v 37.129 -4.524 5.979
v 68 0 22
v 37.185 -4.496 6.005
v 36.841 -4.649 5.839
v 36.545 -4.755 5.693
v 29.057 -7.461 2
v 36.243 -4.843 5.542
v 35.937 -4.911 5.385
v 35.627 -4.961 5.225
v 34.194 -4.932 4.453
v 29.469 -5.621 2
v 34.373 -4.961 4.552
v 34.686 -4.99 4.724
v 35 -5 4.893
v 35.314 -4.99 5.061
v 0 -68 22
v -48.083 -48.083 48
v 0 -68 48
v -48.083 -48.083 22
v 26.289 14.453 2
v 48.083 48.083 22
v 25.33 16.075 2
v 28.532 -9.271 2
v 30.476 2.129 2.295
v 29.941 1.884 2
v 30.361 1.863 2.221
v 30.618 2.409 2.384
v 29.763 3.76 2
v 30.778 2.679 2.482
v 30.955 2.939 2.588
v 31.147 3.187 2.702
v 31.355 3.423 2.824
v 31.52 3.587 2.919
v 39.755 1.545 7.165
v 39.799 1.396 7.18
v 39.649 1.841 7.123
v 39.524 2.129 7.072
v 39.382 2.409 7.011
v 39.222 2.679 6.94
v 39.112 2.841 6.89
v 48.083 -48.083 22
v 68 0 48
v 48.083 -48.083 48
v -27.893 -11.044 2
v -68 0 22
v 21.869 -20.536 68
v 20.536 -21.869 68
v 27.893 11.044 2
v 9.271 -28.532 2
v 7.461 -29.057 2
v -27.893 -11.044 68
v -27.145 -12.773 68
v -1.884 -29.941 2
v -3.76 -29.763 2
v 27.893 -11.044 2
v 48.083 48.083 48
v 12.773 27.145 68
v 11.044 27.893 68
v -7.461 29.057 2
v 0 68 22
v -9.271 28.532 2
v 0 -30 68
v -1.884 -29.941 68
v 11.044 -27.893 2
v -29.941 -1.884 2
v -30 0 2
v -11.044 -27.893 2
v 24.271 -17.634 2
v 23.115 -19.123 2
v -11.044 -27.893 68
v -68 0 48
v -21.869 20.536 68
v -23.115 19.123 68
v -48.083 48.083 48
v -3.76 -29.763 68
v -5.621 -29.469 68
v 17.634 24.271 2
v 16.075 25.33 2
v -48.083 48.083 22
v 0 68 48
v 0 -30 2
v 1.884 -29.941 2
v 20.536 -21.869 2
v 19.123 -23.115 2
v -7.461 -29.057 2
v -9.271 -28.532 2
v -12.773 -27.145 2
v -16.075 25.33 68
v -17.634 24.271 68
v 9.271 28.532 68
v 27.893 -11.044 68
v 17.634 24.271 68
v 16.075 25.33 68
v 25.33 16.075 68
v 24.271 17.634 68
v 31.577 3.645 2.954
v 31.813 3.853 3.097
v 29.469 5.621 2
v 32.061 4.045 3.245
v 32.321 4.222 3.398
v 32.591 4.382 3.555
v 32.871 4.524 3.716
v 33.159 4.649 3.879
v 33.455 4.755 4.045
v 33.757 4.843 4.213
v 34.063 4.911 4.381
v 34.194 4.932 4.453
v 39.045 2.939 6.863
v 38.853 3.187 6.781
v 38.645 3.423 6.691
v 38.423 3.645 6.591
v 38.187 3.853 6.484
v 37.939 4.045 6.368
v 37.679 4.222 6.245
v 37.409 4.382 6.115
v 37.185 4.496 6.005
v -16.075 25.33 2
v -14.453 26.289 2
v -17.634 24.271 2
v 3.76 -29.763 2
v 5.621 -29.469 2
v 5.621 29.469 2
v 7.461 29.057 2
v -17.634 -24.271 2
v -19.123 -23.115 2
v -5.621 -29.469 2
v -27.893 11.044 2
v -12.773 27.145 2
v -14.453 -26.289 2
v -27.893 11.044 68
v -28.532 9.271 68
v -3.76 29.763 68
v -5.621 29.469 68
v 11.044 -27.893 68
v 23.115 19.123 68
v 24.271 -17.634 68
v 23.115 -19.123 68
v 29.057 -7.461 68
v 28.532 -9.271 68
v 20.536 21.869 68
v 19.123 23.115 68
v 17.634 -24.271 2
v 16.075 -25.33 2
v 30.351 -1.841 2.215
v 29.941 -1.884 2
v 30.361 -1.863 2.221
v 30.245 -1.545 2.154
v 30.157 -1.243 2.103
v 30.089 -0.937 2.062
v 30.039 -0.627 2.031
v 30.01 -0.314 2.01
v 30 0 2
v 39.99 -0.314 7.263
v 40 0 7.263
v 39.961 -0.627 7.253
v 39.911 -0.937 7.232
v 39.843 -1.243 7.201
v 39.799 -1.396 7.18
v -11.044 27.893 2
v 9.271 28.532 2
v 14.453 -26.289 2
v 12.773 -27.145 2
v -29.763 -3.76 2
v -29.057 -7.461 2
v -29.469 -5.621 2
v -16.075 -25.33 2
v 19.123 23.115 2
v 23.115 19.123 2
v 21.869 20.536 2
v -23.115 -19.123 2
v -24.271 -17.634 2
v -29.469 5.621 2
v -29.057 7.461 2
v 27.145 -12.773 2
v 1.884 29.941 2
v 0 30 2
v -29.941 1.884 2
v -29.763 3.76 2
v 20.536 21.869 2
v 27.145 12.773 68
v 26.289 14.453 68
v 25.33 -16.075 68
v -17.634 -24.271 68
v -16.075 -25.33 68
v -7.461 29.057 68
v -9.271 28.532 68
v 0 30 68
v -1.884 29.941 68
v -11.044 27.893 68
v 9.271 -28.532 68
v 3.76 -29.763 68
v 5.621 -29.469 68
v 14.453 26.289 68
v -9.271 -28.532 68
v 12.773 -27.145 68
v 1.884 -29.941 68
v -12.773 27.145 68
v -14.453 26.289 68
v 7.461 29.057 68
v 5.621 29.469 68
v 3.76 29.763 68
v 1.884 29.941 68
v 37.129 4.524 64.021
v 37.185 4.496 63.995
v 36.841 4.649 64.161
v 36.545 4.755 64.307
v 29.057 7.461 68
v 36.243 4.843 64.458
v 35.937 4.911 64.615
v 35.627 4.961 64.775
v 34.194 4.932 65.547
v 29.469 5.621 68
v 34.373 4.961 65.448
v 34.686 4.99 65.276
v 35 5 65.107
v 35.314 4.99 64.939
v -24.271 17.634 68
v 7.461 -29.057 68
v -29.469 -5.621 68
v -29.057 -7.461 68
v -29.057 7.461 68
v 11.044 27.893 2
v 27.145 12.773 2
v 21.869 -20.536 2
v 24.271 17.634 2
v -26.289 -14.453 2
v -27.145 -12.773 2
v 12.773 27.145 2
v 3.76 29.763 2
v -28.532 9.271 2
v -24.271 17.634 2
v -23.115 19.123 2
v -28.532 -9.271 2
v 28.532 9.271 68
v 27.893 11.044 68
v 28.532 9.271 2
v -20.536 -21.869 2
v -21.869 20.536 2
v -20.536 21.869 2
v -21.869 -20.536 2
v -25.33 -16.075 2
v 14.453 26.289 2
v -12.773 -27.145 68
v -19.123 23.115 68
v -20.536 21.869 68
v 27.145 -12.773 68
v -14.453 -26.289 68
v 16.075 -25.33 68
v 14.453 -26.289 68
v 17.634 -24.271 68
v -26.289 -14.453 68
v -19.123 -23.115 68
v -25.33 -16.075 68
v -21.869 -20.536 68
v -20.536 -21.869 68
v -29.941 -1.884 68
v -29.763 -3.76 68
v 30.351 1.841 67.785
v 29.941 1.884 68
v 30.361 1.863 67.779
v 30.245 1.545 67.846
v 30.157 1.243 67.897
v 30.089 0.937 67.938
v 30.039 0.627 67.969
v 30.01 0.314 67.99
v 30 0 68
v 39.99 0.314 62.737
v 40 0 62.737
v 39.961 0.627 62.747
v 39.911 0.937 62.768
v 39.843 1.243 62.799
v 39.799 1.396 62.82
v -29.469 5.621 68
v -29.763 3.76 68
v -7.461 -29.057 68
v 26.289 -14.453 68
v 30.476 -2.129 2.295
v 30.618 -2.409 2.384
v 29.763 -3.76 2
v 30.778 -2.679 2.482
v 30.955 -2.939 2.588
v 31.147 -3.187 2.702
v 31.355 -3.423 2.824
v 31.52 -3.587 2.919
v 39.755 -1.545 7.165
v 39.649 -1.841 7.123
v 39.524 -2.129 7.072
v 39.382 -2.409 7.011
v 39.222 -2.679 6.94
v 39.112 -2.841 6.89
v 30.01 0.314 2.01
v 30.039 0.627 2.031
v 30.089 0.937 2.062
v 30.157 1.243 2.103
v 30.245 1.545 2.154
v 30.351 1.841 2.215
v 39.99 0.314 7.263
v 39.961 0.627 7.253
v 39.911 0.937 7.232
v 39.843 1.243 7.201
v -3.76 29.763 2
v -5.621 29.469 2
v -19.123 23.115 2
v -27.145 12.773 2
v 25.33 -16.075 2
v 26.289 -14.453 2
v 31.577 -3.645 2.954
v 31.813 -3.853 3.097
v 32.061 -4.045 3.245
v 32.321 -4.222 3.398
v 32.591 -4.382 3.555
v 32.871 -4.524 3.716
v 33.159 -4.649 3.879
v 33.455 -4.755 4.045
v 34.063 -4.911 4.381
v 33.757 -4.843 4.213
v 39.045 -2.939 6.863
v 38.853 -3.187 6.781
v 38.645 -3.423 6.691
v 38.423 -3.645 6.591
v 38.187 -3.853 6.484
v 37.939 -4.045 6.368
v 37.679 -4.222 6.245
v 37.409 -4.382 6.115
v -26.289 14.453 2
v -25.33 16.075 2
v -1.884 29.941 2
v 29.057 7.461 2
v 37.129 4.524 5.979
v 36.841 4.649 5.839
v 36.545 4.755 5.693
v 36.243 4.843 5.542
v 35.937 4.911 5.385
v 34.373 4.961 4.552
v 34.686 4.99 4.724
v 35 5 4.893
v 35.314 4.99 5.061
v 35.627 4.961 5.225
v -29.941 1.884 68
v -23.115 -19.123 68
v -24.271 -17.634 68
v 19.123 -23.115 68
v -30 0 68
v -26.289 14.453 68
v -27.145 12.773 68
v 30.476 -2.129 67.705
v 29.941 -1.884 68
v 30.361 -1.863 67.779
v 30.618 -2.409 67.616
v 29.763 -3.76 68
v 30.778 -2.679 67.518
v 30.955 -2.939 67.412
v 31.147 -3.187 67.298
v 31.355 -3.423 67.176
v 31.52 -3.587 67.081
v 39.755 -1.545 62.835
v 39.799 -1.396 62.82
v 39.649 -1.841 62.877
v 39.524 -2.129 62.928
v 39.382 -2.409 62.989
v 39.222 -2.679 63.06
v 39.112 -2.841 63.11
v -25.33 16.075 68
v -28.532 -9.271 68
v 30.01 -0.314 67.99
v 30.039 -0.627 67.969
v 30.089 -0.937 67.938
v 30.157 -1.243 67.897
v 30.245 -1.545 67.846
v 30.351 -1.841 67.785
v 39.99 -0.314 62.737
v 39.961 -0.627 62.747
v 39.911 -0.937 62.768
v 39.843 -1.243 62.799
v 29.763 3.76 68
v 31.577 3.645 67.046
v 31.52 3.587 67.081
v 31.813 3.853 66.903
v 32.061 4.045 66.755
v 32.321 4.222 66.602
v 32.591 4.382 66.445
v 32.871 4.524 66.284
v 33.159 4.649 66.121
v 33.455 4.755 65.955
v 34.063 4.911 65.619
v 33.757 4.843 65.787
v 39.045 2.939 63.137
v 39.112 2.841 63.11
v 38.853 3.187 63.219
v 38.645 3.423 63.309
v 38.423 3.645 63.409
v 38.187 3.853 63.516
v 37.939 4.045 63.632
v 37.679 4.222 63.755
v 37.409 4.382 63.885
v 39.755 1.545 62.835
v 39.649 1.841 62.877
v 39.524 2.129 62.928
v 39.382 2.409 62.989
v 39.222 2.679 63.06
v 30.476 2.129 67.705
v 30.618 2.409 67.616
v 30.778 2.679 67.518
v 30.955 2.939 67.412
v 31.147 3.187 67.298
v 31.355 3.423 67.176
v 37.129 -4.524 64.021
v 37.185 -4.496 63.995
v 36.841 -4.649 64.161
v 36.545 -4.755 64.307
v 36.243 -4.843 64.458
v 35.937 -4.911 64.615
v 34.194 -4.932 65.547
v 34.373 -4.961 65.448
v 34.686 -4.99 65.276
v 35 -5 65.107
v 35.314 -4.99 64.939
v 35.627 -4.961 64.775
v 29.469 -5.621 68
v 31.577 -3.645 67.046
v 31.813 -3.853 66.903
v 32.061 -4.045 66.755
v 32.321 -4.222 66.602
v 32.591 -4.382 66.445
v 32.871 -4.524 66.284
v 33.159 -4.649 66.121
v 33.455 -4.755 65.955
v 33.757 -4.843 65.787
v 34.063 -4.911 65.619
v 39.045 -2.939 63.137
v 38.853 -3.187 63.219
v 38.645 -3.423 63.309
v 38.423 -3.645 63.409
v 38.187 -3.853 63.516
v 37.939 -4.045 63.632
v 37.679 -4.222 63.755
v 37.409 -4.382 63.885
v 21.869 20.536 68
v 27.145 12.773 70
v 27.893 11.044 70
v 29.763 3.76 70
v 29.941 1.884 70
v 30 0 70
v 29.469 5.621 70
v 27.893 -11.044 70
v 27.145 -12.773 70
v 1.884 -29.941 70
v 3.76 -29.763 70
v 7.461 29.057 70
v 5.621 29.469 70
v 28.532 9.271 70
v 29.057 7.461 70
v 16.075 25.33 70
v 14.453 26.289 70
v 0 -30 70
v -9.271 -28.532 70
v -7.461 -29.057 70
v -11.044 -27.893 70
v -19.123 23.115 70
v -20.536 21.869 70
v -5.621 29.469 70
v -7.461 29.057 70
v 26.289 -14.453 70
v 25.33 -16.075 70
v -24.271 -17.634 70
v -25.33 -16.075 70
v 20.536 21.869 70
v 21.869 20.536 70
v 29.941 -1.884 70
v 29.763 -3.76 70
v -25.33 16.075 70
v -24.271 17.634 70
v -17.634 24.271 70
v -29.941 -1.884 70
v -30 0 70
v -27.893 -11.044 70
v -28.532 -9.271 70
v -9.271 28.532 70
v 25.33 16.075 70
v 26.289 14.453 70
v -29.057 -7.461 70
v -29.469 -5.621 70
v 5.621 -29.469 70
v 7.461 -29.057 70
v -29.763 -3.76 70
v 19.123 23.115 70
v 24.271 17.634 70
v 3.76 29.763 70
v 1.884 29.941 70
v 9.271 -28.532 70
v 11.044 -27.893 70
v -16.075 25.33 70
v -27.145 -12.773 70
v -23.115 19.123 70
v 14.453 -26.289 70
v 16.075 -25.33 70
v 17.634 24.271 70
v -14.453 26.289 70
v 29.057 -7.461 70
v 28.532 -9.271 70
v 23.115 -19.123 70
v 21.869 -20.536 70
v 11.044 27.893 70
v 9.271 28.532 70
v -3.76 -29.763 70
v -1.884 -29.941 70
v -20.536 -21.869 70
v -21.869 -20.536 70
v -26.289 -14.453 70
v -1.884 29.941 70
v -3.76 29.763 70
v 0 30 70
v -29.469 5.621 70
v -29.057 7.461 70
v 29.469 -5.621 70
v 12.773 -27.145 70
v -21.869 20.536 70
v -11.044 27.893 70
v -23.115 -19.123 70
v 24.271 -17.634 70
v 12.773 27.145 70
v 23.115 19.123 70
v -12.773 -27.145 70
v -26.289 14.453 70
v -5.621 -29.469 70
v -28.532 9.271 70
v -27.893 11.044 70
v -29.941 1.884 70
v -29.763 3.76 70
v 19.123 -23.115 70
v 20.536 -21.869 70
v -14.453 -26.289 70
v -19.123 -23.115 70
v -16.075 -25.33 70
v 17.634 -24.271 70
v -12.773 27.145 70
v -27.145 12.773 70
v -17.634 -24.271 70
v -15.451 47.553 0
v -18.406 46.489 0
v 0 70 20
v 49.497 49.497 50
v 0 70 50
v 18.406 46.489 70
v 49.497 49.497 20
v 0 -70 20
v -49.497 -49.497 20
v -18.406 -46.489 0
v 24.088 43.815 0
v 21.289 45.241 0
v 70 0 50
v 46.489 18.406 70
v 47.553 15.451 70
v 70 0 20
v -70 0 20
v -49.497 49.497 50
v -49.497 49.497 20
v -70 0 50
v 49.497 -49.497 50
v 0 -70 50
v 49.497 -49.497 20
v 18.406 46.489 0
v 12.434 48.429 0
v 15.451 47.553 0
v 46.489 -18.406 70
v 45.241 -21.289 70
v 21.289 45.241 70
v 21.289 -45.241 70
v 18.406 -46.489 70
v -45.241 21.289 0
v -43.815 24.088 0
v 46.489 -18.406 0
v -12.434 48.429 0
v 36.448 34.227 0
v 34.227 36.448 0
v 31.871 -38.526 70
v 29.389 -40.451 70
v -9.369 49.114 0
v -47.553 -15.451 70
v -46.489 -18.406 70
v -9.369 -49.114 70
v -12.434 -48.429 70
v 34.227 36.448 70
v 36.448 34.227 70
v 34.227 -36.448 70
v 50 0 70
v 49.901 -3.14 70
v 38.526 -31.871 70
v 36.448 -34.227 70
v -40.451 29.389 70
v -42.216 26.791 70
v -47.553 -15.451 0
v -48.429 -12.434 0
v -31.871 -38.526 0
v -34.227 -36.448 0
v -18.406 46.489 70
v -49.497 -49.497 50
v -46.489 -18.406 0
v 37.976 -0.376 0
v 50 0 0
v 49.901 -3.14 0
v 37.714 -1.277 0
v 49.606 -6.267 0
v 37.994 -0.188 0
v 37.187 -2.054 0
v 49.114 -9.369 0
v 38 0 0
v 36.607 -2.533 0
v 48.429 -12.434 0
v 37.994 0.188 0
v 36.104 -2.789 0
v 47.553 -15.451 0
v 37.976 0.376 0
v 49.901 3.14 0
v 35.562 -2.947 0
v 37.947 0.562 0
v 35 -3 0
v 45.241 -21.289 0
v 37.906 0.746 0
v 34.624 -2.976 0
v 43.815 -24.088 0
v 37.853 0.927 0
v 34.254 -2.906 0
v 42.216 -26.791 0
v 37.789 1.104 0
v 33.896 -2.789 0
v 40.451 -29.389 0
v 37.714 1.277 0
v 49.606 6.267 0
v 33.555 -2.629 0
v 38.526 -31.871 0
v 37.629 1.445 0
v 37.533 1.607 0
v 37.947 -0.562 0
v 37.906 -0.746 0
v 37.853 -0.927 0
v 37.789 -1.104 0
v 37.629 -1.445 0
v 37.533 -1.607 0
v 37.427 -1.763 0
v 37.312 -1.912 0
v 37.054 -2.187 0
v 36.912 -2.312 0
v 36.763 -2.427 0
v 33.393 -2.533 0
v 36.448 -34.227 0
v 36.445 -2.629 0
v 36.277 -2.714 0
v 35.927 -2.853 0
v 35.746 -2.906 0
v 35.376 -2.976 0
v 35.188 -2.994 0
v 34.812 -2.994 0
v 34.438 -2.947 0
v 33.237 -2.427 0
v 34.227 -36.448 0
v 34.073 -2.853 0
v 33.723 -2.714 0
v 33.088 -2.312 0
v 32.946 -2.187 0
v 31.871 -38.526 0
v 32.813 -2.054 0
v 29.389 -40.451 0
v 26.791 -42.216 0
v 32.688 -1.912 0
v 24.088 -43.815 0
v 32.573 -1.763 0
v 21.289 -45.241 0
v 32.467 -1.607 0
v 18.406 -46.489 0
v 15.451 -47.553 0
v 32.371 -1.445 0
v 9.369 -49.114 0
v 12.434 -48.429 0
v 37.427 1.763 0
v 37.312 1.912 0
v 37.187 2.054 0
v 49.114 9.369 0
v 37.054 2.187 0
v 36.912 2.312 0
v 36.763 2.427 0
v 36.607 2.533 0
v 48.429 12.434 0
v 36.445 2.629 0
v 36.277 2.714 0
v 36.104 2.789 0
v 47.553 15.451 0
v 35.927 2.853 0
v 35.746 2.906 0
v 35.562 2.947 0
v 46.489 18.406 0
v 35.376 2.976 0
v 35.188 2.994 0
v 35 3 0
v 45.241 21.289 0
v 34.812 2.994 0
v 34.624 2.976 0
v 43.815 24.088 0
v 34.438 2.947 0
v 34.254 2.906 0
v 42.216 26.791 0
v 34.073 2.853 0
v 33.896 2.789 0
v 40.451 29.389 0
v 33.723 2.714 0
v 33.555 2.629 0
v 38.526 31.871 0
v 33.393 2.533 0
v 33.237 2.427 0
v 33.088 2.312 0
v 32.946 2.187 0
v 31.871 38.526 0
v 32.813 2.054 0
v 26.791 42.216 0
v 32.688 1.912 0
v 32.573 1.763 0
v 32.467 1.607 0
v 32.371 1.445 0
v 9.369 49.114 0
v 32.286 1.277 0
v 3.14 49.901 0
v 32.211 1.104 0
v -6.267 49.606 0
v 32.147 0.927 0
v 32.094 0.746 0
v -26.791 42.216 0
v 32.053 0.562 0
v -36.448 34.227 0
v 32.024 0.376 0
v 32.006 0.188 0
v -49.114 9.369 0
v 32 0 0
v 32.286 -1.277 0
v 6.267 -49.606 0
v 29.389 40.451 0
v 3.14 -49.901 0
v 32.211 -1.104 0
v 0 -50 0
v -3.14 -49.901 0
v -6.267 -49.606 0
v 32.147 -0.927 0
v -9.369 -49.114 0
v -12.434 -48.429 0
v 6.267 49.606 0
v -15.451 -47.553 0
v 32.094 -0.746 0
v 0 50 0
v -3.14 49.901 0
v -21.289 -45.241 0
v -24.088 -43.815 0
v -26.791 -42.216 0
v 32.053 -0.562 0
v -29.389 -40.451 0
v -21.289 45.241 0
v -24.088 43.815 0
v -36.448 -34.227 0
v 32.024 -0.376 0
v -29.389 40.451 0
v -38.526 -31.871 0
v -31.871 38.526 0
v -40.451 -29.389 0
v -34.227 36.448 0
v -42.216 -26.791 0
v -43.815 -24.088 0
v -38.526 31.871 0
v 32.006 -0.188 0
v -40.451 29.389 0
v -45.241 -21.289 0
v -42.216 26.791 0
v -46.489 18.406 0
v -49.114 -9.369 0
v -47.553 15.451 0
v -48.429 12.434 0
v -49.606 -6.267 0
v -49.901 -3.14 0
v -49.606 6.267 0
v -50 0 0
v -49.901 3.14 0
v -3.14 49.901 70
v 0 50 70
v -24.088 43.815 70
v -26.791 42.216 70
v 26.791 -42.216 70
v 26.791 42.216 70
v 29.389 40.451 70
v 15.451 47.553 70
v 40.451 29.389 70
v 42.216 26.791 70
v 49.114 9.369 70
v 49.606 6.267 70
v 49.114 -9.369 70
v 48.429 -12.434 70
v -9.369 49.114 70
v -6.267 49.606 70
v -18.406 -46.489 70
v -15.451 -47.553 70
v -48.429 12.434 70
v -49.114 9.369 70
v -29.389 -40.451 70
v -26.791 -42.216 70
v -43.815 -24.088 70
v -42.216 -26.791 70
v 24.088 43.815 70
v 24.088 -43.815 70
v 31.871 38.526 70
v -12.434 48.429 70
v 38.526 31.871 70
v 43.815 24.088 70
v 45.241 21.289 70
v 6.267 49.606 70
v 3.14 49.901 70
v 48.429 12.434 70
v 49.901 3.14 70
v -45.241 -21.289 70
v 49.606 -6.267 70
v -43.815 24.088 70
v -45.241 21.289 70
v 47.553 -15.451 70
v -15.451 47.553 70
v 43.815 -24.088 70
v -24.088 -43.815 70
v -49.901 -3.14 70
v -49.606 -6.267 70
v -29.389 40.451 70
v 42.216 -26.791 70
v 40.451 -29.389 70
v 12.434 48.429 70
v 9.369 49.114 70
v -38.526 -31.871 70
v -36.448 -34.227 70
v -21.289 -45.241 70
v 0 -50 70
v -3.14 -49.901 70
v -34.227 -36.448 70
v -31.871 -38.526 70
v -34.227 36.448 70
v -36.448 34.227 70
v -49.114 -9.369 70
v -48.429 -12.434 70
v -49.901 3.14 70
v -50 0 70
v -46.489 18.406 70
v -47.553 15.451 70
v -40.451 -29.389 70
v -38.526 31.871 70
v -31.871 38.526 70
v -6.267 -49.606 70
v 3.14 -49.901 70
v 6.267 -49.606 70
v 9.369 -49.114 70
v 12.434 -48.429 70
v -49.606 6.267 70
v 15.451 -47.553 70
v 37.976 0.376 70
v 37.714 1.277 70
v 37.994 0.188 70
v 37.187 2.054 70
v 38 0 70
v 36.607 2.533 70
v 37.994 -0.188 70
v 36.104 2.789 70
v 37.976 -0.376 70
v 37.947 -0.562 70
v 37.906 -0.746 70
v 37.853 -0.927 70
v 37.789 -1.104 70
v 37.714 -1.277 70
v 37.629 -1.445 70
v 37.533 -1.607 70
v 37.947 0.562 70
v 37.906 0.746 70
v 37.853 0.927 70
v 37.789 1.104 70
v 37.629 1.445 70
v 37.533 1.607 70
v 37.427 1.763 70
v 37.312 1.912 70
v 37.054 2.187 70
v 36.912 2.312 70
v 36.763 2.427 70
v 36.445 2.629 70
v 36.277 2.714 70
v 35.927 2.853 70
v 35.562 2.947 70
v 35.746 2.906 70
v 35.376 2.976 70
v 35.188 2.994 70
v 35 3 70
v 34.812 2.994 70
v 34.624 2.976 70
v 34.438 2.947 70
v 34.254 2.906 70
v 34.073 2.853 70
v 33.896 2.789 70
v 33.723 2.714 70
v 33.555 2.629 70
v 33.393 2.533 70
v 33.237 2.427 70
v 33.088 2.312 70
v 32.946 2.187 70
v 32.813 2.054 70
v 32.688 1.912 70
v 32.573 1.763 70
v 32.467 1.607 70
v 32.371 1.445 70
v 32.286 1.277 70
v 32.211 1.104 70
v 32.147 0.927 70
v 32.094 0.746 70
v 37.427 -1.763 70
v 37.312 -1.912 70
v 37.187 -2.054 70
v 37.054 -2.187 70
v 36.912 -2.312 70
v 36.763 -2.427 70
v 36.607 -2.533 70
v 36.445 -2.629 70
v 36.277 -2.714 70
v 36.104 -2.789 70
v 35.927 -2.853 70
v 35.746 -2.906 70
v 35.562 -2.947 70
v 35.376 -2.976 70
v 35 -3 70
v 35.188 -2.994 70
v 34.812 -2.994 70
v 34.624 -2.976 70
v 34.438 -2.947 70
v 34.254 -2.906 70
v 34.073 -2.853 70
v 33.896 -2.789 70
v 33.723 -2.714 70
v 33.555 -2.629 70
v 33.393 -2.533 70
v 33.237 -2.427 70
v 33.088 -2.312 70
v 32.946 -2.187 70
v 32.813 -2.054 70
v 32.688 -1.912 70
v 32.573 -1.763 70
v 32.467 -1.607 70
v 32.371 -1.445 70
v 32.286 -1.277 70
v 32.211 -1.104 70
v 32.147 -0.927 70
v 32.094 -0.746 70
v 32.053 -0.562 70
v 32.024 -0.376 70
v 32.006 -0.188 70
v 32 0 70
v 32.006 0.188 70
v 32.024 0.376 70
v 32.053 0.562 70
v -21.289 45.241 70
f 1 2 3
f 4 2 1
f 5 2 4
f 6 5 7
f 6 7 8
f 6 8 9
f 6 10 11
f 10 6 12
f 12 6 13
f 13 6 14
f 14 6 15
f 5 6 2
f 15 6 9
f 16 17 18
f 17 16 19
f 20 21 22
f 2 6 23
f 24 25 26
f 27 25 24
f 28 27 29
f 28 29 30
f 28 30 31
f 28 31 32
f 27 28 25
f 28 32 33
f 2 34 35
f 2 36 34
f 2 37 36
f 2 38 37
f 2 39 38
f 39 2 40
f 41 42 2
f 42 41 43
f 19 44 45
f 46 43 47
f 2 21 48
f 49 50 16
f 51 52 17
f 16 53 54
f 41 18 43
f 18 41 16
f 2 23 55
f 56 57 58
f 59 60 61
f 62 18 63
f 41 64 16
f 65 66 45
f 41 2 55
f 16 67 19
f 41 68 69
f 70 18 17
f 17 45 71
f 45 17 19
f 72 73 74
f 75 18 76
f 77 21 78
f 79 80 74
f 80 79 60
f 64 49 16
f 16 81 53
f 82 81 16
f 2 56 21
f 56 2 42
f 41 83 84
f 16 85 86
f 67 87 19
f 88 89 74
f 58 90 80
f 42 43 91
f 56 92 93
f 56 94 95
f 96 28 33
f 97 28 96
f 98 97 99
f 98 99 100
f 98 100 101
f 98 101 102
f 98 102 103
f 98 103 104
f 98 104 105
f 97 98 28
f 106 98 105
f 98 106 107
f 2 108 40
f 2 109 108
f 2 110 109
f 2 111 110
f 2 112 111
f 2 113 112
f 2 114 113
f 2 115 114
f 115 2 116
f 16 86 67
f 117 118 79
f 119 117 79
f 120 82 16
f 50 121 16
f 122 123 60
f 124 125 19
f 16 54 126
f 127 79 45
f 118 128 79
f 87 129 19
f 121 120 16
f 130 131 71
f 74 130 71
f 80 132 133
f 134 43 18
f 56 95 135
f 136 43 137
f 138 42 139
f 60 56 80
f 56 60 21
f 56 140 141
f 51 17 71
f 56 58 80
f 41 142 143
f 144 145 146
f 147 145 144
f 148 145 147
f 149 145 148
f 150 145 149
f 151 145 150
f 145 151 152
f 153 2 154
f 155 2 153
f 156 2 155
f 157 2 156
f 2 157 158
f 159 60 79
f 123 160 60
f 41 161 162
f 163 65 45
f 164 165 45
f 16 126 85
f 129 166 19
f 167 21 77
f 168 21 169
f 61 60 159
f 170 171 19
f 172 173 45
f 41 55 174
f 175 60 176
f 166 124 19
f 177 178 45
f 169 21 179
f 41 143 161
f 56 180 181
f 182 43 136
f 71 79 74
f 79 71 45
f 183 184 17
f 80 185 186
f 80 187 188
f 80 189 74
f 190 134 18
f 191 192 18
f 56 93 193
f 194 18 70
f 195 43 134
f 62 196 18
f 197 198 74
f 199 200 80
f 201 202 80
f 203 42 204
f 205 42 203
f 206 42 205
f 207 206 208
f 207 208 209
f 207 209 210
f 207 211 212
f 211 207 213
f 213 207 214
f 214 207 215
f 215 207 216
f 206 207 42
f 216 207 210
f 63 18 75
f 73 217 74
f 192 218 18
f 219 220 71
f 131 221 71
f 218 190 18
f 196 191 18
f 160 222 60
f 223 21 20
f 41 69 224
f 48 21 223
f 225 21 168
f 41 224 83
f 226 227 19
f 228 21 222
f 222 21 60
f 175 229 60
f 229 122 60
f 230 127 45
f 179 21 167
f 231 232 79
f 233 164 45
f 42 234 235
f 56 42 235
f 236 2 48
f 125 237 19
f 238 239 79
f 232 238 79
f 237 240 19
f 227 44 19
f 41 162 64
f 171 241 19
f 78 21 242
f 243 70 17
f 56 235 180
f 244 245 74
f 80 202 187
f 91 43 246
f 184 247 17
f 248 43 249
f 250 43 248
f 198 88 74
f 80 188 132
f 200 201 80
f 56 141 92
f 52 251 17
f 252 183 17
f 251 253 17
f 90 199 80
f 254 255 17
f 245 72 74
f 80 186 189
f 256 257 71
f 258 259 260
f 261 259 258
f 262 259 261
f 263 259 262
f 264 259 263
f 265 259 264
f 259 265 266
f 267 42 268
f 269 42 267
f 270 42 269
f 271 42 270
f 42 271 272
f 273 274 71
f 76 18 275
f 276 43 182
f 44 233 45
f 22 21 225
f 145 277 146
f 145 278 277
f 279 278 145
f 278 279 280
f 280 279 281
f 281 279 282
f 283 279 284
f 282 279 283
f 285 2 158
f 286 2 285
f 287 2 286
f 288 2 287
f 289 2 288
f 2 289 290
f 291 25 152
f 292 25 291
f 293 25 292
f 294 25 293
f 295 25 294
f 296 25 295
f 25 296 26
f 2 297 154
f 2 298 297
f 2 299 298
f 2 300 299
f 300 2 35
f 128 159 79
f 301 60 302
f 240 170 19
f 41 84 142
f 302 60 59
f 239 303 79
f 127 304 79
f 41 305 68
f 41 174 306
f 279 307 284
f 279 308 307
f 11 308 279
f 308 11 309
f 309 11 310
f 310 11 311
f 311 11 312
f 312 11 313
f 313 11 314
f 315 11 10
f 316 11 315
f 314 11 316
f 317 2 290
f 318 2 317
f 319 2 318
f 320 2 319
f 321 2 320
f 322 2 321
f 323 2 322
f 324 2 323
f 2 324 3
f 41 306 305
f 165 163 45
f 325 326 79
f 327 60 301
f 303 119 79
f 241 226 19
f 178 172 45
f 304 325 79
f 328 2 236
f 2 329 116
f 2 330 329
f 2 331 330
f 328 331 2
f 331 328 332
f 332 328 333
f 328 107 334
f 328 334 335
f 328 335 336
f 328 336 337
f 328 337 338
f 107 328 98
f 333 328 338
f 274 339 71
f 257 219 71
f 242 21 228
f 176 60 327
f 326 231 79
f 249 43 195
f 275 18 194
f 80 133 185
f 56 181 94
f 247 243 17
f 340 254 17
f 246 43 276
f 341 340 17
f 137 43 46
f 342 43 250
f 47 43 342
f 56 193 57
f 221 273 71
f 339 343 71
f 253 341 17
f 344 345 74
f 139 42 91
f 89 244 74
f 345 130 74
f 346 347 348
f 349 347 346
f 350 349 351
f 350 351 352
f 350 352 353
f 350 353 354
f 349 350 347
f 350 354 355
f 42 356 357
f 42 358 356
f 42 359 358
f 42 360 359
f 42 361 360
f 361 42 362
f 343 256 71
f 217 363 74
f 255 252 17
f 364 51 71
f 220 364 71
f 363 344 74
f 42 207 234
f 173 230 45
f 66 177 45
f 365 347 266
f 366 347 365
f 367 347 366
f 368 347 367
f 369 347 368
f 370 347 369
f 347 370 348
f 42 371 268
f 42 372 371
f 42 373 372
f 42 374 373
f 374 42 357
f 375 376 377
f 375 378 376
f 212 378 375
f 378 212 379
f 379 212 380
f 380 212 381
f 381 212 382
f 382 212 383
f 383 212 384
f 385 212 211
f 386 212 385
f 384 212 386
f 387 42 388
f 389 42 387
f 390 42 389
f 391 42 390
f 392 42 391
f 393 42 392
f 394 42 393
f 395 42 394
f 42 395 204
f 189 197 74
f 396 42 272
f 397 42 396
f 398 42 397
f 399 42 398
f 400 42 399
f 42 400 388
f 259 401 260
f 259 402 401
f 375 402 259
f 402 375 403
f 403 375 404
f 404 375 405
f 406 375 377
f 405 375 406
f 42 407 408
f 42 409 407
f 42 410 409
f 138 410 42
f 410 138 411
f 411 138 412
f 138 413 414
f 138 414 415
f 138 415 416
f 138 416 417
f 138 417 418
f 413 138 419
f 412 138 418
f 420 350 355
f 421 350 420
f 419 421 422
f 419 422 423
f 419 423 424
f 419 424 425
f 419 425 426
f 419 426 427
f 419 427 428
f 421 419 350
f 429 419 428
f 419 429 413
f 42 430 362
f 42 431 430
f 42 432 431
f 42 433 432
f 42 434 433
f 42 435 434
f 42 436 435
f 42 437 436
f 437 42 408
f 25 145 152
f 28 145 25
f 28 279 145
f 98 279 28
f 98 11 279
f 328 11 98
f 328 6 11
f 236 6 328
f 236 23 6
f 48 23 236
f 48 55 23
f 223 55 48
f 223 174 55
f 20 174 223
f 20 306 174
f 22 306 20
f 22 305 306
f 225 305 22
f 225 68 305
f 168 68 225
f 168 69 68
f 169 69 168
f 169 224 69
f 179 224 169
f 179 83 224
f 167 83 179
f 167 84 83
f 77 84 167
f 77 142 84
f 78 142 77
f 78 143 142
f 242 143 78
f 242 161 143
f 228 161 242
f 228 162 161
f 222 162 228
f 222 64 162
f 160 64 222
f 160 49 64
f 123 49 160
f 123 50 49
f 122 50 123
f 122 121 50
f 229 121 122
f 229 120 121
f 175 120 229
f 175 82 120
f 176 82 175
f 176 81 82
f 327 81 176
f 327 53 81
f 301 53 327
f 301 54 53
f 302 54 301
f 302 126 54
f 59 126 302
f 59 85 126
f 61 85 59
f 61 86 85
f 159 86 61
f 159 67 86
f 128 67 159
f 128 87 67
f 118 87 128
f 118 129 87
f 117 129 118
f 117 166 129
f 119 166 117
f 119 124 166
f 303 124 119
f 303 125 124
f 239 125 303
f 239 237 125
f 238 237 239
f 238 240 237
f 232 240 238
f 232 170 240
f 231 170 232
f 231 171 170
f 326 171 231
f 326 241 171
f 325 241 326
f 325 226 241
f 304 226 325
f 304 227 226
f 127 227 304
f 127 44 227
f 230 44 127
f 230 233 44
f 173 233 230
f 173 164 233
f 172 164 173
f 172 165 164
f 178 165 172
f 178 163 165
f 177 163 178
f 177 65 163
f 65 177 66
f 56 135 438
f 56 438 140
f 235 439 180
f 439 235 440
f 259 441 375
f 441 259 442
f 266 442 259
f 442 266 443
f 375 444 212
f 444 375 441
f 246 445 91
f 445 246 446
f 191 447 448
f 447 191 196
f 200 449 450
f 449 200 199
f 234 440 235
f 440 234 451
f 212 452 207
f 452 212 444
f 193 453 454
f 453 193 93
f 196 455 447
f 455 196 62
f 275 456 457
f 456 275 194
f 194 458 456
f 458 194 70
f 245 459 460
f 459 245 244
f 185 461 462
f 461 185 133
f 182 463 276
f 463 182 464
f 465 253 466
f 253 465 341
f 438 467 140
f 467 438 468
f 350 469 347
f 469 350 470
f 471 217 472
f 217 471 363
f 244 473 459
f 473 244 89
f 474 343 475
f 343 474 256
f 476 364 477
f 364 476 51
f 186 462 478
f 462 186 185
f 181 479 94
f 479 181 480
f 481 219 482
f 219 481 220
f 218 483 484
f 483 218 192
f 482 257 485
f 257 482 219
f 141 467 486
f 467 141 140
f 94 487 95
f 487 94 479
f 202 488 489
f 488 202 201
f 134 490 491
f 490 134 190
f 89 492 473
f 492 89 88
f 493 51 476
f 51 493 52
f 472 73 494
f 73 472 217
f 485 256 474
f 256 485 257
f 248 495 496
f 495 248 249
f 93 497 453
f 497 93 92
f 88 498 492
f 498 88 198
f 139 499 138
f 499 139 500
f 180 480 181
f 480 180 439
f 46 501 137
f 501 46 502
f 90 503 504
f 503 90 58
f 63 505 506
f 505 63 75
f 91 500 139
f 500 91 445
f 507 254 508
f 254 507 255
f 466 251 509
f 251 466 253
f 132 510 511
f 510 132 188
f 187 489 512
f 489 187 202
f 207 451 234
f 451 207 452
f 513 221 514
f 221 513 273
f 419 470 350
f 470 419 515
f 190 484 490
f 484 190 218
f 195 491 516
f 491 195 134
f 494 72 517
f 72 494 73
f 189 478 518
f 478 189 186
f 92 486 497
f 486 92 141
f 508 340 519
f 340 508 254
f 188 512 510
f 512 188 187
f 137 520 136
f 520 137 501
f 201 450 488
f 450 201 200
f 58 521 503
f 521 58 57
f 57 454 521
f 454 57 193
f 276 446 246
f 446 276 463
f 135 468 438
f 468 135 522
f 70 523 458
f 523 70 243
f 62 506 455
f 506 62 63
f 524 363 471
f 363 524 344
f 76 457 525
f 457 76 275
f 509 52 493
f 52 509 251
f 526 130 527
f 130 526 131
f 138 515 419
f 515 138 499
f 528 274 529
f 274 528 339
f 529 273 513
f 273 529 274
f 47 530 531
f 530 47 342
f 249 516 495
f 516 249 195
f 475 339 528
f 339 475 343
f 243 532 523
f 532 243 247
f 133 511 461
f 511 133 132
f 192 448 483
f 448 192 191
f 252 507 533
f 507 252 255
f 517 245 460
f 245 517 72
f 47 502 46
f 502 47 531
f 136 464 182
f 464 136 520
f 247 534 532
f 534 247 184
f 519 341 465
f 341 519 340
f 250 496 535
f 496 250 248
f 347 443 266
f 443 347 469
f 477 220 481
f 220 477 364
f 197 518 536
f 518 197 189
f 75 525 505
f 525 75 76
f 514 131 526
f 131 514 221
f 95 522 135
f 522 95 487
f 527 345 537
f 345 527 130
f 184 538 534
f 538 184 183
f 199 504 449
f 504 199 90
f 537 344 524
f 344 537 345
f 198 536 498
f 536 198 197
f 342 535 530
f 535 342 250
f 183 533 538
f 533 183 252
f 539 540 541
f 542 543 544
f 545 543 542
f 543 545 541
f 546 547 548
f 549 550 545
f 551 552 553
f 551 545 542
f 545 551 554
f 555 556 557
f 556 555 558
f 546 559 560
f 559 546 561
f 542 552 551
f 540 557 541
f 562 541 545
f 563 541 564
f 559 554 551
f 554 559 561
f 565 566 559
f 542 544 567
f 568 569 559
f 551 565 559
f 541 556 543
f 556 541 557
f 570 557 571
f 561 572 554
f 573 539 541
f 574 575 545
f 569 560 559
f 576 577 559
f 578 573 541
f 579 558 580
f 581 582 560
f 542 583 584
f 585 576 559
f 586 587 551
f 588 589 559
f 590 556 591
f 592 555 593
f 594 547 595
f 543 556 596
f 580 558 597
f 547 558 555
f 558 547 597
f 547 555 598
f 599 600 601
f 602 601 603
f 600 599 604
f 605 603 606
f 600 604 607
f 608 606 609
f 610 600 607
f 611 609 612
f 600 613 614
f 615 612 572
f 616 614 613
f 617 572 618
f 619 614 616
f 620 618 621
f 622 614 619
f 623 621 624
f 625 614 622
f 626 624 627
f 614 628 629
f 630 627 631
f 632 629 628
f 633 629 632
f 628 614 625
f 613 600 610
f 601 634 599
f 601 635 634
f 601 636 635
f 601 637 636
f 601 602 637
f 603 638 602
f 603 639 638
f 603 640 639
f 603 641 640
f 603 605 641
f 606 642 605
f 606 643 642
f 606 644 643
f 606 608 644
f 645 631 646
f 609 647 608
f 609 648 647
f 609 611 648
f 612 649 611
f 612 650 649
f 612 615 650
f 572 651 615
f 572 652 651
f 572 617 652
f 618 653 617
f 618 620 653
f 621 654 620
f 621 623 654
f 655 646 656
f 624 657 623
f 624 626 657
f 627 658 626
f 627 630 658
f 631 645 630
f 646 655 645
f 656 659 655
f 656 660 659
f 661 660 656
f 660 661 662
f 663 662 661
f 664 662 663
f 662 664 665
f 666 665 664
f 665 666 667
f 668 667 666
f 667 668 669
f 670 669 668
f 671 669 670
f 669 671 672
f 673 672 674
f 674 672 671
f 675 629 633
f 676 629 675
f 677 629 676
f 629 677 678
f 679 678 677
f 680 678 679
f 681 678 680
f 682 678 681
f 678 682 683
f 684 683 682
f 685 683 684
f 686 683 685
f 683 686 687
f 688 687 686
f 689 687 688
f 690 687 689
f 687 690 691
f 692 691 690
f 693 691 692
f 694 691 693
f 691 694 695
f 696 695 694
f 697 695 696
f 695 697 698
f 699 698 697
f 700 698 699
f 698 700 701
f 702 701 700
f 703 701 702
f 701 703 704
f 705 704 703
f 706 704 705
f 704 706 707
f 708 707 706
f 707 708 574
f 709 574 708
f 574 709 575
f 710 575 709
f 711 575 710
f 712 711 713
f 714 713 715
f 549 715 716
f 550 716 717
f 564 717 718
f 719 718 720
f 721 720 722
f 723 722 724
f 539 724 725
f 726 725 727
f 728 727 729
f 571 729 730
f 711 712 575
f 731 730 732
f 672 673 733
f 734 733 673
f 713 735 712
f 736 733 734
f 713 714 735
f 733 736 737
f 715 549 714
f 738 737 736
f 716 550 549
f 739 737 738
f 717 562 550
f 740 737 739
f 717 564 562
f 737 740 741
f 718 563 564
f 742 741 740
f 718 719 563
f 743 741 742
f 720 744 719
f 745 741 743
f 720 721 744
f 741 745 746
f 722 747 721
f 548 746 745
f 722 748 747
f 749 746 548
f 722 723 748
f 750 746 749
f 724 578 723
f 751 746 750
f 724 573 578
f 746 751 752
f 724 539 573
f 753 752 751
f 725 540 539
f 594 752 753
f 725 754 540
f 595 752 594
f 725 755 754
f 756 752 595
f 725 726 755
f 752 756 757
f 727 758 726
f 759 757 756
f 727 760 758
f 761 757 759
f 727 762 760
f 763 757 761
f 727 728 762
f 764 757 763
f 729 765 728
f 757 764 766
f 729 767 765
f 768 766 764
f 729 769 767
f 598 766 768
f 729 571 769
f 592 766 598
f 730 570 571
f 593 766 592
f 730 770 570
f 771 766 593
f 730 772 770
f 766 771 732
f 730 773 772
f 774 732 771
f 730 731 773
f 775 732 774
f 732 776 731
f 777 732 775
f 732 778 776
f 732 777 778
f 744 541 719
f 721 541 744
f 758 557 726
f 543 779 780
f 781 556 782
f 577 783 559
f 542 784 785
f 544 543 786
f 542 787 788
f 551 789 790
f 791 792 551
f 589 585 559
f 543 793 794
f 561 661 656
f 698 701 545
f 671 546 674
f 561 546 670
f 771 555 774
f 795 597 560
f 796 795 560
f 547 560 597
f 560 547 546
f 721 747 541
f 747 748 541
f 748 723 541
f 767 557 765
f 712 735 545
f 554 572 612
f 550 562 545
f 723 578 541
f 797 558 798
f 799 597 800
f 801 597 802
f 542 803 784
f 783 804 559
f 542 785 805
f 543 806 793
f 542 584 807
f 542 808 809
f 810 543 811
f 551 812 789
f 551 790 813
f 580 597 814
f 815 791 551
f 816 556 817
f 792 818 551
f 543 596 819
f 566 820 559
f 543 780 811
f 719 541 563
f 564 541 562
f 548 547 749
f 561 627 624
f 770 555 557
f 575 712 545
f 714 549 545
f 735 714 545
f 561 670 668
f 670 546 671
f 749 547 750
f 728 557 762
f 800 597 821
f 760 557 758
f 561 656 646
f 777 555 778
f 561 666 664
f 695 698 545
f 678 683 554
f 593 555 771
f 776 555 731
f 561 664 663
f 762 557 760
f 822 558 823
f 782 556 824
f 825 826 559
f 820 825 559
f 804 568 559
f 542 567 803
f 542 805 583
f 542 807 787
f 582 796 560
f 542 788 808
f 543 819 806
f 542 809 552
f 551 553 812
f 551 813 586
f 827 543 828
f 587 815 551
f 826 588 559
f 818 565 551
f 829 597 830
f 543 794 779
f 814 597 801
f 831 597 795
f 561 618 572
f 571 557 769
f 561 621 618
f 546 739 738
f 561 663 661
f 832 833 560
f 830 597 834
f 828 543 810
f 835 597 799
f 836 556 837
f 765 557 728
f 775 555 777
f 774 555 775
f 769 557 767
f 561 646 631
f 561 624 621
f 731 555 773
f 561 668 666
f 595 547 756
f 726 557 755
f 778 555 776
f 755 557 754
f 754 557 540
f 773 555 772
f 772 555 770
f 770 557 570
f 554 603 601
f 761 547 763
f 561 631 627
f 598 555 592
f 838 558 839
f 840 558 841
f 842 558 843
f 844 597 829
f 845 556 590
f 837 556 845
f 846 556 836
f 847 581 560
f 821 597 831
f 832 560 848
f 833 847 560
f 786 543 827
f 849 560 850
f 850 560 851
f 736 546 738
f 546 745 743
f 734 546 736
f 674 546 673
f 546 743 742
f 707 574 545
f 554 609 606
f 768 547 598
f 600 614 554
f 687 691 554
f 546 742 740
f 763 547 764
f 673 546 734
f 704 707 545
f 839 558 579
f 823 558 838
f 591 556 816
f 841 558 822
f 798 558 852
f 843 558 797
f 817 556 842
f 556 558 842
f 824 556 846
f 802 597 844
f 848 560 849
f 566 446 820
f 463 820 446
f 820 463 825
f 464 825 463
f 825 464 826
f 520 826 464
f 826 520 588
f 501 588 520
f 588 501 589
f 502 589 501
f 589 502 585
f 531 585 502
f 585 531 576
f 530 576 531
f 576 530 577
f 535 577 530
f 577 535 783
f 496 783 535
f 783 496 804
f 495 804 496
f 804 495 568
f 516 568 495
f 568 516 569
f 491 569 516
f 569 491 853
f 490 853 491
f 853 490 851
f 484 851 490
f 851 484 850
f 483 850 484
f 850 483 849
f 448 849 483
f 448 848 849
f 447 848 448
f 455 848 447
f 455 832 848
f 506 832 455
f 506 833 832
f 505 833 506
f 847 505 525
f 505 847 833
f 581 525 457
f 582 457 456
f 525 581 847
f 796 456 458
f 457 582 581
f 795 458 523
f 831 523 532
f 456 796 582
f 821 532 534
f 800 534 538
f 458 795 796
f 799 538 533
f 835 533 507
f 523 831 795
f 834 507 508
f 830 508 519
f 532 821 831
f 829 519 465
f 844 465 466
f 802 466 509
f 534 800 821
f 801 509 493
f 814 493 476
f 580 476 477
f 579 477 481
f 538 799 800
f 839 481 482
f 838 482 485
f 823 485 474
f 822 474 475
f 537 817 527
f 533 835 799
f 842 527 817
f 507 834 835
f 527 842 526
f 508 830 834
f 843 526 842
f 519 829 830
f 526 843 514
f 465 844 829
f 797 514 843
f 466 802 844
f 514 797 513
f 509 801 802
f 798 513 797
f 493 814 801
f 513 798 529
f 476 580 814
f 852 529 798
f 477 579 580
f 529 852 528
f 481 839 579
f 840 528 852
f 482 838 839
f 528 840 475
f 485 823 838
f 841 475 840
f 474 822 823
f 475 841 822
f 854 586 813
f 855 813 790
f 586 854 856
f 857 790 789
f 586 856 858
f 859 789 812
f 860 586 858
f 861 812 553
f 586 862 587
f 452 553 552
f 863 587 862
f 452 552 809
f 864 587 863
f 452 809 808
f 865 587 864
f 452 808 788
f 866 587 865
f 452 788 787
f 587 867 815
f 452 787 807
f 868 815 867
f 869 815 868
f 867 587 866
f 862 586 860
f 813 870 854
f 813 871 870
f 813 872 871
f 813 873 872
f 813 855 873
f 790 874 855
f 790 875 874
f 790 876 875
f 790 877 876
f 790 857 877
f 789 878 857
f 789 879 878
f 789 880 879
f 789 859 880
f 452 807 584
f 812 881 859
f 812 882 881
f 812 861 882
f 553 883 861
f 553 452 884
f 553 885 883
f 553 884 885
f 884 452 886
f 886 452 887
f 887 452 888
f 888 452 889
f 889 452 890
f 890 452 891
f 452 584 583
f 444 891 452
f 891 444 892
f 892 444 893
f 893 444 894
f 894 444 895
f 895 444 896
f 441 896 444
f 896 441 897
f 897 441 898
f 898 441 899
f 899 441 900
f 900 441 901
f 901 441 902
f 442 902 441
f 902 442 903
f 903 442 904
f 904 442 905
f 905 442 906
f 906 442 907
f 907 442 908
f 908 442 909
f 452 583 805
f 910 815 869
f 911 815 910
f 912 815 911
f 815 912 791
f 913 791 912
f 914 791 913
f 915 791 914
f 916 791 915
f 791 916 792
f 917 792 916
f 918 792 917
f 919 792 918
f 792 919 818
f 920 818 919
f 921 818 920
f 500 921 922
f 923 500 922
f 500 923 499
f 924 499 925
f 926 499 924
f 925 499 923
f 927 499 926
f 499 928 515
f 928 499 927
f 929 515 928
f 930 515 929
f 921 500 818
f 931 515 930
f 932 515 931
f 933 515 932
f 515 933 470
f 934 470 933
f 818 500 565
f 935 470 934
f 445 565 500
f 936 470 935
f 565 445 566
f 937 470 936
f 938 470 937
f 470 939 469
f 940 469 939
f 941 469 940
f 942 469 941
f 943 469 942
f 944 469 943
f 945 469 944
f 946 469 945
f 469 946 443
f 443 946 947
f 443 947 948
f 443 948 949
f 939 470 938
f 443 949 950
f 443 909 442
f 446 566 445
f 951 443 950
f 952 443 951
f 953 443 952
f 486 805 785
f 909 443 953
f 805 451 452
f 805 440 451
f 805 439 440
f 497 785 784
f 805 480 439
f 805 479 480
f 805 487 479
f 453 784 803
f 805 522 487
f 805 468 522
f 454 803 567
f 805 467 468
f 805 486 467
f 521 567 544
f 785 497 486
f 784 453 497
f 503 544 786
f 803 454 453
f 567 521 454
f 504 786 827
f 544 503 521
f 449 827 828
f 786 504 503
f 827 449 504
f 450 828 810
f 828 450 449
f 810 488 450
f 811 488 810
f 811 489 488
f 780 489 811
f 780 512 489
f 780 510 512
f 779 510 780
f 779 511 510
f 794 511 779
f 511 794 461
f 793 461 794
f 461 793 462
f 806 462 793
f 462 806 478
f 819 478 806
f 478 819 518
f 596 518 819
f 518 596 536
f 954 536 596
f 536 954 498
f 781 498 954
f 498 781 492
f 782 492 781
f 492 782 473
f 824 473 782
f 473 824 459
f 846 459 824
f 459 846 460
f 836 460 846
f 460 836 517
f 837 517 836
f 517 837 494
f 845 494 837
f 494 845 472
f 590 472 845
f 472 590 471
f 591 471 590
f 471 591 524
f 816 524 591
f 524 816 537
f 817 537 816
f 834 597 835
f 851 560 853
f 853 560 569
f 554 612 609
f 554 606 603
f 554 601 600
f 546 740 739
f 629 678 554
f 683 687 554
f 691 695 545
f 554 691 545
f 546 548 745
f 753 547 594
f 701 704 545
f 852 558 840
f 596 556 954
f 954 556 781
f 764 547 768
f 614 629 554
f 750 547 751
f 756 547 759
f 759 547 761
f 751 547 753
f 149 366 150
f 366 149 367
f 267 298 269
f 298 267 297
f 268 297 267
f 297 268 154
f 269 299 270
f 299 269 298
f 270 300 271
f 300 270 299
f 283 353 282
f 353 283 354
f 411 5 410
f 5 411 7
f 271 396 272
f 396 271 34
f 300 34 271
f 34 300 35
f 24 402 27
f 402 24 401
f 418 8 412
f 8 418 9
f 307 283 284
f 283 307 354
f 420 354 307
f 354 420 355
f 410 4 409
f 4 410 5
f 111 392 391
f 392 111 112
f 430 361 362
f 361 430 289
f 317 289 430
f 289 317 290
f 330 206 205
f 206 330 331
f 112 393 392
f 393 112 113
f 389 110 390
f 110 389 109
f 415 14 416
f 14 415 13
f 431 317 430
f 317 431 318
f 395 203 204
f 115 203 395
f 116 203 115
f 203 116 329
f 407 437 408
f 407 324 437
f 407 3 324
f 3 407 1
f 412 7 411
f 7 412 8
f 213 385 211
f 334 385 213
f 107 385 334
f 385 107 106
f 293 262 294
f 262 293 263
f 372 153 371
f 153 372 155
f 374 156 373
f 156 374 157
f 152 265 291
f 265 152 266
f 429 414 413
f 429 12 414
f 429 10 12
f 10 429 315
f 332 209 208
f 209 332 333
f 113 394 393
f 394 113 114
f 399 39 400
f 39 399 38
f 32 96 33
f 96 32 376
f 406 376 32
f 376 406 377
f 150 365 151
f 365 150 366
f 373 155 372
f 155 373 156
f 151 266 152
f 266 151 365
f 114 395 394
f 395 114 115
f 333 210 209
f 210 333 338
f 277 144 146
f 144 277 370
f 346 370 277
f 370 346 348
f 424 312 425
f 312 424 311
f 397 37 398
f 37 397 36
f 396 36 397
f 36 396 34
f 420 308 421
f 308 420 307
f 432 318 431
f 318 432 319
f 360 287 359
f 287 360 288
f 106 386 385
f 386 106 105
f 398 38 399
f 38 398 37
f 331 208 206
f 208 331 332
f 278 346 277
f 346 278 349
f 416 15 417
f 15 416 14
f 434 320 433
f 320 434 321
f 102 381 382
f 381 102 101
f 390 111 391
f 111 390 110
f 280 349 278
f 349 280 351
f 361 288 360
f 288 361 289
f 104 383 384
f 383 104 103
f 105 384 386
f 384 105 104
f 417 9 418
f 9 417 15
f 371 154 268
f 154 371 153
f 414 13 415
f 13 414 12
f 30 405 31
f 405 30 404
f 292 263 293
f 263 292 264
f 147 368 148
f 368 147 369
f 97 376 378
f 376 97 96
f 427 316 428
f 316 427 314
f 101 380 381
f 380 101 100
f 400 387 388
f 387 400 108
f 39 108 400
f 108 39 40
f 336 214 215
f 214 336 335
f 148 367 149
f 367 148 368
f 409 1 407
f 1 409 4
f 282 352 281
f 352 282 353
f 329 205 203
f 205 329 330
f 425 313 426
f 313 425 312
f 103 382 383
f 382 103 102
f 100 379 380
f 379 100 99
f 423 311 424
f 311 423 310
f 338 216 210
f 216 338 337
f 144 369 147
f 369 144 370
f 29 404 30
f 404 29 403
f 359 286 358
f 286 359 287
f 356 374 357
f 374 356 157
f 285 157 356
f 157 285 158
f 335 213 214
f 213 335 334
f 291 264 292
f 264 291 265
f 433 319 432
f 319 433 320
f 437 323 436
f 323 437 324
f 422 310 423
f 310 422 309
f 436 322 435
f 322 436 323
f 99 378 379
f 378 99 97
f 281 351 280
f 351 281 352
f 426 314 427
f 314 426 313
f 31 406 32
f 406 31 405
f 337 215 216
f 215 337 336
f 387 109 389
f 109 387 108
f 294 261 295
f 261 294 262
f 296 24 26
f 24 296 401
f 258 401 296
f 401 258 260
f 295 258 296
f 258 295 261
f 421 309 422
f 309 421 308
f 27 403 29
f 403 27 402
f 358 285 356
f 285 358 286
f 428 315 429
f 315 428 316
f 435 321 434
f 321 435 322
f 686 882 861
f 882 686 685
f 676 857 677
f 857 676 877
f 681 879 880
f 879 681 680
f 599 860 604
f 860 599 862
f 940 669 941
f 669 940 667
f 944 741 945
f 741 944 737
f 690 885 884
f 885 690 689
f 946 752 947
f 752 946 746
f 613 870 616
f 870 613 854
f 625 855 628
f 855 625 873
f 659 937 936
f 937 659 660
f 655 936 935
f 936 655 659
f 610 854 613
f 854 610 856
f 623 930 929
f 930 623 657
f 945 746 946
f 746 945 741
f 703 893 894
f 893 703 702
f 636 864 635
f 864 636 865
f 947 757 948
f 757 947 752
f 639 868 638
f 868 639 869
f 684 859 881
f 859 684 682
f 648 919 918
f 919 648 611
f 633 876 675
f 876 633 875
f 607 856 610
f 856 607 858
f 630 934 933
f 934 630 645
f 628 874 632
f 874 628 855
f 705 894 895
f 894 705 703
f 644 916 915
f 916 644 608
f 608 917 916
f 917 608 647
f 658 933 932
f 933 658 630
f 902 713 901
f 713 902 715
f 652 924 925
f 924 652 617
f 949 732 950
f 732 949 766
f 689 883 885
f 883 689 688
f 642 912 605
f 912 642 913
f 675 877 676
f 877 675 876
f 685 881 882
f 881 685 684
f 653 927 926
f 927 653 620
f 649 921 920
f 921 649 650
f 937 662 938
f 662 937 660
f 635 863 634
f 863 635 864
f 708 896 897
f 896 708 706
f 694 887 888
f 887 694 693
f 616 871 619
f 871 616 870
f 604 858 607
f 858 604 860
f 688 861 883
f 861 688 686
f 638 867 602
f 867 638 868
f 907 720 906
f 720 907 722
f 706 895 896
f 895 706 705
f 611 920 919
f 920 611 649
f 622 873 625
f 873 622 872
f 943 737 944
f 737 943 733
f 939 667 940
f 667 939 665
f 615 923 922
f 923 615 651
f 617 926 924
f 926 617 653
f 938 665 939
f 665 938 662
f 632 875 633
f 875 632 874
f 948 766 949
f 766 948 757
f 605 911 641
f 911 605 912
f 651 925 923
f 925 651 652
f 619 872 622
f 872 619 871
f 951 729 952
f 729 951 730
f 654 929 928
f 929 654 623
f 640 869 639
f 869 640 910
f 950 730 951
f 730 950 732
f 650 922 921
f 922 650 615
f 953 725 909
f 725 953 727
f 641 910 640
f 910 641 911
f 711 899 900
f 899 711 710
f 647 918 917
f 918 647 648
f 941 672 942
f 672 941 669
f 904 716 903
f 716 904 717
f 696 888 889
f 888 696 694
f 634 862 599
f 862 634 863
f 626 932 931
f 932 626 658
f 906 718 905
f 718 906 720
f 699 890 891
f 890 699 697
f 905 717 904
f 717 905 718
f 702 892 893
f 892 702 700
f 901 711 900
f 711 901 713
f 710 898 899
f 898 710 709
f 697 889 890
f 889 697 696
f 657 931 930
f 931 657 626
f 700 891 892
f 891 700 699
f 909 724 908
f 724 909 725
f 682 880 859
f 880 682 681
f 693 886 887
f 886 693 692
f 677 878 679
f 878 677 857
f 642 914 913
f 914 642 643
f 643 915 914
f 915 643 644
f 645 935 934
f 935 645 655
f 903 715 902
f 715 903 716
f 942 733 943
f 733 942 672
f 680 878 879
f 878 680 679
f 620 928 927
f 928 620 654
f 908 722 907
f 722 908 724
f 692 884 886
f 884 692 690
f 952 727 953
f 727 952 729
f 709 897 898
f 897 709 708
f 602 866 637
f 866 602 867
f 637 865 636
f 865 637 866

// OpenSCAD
$fn = 100;

r = 50;  // tank radius
h = 70;  // tank height
fh = 30; // flare height
fw = 20; // flare width
fn = 8; // flare sides (corresponds with number of sensors)
sw = 3; // drive shaft width
so = 35; // drive shaft offset
ax = 2.9; // axel width
hw = r - 20; // hole width
t = 2; // shell thickness

difference() {
    union (){
        shell();
        // Shaft lining
        translate([so, 0]) cylinder(h, sw + t, sw + t);
    }
    
    // Shaft hole
    translate([so, 0]) cylinder(h, sw, sw);
}

module shell() {
    
    difference() {
        // Outer
        hull() {
            cylinder(h, r, r);
            translate([0, 0, h/2 - fh/2]) cylinder(fh, r+fw, r+fw, $fn=fn);
        }
        
        union() {
            // Inner
            translate([0, 0, t]) hull() {
                r1 = hw;
                r2 = r+fw-t;
                
                cylinder(h-t*2, r1, r1);
                translate([0, 0, h/2 - fh/2]) cylinder(fh-t*2, r2, r2, $fn=fn);
            }
            
            // Upper hole
            translate([0, 0, t]) cylinder(h, hw, hw);
        }
    }
    
}
